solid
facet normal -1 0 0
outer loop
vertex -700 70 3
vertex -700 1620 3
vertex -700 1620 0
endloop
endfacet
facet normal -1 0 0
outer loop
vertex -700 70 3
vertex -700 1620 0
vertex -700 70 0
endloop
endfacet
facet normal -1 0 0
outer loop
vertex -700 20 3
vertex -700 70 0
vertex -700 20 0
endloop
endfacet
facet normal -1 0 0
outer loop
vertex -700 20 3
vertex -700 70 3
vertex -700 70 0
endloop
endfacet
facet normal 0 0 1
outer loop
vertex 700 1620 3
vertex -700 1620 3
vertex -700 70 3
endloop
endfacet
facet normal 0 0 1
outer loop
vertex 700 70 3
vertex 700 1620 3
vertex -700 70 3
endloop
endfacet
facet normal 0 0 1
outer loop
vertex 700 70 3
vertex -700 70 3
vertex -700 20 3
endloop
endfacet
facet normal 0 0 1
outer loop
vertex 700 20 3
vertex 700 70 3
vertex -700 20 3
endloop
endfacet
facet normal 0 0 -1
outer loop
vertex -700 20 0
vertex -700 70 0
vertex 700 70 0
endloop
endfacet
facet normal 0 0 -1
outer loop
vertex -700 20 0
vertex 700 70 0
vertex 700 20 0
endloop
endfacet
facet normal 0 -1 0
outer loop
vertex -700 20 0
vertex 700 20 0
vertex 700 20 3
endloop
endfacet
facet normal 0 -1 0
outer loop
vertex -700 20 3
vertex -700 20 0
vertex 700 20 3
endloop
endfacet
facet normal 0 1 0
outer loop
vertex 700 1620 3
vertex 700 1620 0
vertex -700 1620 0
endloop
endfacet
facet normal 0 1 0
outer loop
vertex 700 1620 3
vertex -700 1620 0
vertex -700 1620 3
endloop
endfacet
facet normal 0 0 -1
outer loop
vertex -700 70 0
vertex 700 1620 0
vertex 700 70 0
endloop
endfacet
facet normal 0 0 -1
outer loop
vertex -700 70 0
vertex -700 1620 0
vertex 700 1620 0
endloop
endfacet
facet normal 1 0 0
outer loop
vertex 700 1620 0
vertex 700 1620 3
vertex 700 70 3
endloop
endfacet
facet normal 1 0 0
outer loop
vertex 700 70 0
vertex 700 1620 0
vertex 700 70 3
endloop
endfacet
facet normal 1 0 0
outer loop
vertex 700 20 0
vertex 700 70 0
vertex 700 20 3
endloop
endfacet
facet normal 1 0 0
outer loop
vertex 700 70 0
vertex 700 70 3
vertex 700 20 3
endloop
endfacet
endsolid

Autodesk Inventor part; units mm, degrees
ref_plane "YZ Plane" through (0, 0, 0) normal (1, 0, 0) x (0, 1, 0)
ref_plane "XZ Plane" through (0, 0, 0) normal (0, 1, 0) x (-1, 0, 0)
ref_plane "XY Plane" through (0, 0, 0) normal (0, 0, 1) x (1, 0, 0)
sketch "Sketch1" plane through (0, 0, 0) normal (1, 0, 0) x (0, 1, 0)
  line L0 (1620, 0) -> (70, 0)
  line L1 (70, 0) -> (20, 0)
  line L2 (20, 0) -> (0, 0)
  dimension "d0" = 180
  dimension "d1" = 50
  dimension "d2" = 1620
  dimension "d3" = 20
contour flange "Contour Flange1" sketch "Sketch1" thickness 3 bend radius 3 width 1400 along (1, 0, 0) mid plane yes both sides no wall seen from (0, 845, 0) lies toward (0, 0, 1) curves L0 L1
bend "Bend1"
corner "Corner1"
sketch "Sketch2" plane through (-697.8787, 1620, 0.8787) normal (-0.7071068, 0, 0.7071068) x (0, -1, 0)
  line L0 (1600, 0) -> (0, 0)
  line L1 (0, 0) -> (0, -50)
  line L2 (0, -50) -> (1600, -50)
  line L3 (1600, -50) -> (1600, 0)
equation "\"d4\" = Thickness"
equation "\"d5\" = BendReliefWidth"
equation "\"d6\" = BendReliefDepth"
equation "\"d7\" = MinimumRemnant"
equation "\"d8\" = TransitionRadius"
equation "\"d10\" = BendRadius"
equation "\"d12\" = CornerReliefSize"
equation "\"d13\" = GapSize"
equation "\"d14\" = JacobiRadiusSize"
equation "\"BendRadius\" = Thickness"
equation "\"BendReliefWidth\" = Thickness"
equation "\"BendReliefDepth\" = 0.5 * Thickness"
equation "\"CornerReliefSize\" = 4 * Thickness"
equation "\"MinimumRemnant\" = 2 * Thickness"
equation "\"TransitionRadius\" = BendRadius"
equation "\"JacobiRadiusSize\" = BendRadius"
equation "\"GapSize\" = Thickness"
equation "\"Thickness\" = 3"
properties part number "GBK-RK-0014 short wall 4"
